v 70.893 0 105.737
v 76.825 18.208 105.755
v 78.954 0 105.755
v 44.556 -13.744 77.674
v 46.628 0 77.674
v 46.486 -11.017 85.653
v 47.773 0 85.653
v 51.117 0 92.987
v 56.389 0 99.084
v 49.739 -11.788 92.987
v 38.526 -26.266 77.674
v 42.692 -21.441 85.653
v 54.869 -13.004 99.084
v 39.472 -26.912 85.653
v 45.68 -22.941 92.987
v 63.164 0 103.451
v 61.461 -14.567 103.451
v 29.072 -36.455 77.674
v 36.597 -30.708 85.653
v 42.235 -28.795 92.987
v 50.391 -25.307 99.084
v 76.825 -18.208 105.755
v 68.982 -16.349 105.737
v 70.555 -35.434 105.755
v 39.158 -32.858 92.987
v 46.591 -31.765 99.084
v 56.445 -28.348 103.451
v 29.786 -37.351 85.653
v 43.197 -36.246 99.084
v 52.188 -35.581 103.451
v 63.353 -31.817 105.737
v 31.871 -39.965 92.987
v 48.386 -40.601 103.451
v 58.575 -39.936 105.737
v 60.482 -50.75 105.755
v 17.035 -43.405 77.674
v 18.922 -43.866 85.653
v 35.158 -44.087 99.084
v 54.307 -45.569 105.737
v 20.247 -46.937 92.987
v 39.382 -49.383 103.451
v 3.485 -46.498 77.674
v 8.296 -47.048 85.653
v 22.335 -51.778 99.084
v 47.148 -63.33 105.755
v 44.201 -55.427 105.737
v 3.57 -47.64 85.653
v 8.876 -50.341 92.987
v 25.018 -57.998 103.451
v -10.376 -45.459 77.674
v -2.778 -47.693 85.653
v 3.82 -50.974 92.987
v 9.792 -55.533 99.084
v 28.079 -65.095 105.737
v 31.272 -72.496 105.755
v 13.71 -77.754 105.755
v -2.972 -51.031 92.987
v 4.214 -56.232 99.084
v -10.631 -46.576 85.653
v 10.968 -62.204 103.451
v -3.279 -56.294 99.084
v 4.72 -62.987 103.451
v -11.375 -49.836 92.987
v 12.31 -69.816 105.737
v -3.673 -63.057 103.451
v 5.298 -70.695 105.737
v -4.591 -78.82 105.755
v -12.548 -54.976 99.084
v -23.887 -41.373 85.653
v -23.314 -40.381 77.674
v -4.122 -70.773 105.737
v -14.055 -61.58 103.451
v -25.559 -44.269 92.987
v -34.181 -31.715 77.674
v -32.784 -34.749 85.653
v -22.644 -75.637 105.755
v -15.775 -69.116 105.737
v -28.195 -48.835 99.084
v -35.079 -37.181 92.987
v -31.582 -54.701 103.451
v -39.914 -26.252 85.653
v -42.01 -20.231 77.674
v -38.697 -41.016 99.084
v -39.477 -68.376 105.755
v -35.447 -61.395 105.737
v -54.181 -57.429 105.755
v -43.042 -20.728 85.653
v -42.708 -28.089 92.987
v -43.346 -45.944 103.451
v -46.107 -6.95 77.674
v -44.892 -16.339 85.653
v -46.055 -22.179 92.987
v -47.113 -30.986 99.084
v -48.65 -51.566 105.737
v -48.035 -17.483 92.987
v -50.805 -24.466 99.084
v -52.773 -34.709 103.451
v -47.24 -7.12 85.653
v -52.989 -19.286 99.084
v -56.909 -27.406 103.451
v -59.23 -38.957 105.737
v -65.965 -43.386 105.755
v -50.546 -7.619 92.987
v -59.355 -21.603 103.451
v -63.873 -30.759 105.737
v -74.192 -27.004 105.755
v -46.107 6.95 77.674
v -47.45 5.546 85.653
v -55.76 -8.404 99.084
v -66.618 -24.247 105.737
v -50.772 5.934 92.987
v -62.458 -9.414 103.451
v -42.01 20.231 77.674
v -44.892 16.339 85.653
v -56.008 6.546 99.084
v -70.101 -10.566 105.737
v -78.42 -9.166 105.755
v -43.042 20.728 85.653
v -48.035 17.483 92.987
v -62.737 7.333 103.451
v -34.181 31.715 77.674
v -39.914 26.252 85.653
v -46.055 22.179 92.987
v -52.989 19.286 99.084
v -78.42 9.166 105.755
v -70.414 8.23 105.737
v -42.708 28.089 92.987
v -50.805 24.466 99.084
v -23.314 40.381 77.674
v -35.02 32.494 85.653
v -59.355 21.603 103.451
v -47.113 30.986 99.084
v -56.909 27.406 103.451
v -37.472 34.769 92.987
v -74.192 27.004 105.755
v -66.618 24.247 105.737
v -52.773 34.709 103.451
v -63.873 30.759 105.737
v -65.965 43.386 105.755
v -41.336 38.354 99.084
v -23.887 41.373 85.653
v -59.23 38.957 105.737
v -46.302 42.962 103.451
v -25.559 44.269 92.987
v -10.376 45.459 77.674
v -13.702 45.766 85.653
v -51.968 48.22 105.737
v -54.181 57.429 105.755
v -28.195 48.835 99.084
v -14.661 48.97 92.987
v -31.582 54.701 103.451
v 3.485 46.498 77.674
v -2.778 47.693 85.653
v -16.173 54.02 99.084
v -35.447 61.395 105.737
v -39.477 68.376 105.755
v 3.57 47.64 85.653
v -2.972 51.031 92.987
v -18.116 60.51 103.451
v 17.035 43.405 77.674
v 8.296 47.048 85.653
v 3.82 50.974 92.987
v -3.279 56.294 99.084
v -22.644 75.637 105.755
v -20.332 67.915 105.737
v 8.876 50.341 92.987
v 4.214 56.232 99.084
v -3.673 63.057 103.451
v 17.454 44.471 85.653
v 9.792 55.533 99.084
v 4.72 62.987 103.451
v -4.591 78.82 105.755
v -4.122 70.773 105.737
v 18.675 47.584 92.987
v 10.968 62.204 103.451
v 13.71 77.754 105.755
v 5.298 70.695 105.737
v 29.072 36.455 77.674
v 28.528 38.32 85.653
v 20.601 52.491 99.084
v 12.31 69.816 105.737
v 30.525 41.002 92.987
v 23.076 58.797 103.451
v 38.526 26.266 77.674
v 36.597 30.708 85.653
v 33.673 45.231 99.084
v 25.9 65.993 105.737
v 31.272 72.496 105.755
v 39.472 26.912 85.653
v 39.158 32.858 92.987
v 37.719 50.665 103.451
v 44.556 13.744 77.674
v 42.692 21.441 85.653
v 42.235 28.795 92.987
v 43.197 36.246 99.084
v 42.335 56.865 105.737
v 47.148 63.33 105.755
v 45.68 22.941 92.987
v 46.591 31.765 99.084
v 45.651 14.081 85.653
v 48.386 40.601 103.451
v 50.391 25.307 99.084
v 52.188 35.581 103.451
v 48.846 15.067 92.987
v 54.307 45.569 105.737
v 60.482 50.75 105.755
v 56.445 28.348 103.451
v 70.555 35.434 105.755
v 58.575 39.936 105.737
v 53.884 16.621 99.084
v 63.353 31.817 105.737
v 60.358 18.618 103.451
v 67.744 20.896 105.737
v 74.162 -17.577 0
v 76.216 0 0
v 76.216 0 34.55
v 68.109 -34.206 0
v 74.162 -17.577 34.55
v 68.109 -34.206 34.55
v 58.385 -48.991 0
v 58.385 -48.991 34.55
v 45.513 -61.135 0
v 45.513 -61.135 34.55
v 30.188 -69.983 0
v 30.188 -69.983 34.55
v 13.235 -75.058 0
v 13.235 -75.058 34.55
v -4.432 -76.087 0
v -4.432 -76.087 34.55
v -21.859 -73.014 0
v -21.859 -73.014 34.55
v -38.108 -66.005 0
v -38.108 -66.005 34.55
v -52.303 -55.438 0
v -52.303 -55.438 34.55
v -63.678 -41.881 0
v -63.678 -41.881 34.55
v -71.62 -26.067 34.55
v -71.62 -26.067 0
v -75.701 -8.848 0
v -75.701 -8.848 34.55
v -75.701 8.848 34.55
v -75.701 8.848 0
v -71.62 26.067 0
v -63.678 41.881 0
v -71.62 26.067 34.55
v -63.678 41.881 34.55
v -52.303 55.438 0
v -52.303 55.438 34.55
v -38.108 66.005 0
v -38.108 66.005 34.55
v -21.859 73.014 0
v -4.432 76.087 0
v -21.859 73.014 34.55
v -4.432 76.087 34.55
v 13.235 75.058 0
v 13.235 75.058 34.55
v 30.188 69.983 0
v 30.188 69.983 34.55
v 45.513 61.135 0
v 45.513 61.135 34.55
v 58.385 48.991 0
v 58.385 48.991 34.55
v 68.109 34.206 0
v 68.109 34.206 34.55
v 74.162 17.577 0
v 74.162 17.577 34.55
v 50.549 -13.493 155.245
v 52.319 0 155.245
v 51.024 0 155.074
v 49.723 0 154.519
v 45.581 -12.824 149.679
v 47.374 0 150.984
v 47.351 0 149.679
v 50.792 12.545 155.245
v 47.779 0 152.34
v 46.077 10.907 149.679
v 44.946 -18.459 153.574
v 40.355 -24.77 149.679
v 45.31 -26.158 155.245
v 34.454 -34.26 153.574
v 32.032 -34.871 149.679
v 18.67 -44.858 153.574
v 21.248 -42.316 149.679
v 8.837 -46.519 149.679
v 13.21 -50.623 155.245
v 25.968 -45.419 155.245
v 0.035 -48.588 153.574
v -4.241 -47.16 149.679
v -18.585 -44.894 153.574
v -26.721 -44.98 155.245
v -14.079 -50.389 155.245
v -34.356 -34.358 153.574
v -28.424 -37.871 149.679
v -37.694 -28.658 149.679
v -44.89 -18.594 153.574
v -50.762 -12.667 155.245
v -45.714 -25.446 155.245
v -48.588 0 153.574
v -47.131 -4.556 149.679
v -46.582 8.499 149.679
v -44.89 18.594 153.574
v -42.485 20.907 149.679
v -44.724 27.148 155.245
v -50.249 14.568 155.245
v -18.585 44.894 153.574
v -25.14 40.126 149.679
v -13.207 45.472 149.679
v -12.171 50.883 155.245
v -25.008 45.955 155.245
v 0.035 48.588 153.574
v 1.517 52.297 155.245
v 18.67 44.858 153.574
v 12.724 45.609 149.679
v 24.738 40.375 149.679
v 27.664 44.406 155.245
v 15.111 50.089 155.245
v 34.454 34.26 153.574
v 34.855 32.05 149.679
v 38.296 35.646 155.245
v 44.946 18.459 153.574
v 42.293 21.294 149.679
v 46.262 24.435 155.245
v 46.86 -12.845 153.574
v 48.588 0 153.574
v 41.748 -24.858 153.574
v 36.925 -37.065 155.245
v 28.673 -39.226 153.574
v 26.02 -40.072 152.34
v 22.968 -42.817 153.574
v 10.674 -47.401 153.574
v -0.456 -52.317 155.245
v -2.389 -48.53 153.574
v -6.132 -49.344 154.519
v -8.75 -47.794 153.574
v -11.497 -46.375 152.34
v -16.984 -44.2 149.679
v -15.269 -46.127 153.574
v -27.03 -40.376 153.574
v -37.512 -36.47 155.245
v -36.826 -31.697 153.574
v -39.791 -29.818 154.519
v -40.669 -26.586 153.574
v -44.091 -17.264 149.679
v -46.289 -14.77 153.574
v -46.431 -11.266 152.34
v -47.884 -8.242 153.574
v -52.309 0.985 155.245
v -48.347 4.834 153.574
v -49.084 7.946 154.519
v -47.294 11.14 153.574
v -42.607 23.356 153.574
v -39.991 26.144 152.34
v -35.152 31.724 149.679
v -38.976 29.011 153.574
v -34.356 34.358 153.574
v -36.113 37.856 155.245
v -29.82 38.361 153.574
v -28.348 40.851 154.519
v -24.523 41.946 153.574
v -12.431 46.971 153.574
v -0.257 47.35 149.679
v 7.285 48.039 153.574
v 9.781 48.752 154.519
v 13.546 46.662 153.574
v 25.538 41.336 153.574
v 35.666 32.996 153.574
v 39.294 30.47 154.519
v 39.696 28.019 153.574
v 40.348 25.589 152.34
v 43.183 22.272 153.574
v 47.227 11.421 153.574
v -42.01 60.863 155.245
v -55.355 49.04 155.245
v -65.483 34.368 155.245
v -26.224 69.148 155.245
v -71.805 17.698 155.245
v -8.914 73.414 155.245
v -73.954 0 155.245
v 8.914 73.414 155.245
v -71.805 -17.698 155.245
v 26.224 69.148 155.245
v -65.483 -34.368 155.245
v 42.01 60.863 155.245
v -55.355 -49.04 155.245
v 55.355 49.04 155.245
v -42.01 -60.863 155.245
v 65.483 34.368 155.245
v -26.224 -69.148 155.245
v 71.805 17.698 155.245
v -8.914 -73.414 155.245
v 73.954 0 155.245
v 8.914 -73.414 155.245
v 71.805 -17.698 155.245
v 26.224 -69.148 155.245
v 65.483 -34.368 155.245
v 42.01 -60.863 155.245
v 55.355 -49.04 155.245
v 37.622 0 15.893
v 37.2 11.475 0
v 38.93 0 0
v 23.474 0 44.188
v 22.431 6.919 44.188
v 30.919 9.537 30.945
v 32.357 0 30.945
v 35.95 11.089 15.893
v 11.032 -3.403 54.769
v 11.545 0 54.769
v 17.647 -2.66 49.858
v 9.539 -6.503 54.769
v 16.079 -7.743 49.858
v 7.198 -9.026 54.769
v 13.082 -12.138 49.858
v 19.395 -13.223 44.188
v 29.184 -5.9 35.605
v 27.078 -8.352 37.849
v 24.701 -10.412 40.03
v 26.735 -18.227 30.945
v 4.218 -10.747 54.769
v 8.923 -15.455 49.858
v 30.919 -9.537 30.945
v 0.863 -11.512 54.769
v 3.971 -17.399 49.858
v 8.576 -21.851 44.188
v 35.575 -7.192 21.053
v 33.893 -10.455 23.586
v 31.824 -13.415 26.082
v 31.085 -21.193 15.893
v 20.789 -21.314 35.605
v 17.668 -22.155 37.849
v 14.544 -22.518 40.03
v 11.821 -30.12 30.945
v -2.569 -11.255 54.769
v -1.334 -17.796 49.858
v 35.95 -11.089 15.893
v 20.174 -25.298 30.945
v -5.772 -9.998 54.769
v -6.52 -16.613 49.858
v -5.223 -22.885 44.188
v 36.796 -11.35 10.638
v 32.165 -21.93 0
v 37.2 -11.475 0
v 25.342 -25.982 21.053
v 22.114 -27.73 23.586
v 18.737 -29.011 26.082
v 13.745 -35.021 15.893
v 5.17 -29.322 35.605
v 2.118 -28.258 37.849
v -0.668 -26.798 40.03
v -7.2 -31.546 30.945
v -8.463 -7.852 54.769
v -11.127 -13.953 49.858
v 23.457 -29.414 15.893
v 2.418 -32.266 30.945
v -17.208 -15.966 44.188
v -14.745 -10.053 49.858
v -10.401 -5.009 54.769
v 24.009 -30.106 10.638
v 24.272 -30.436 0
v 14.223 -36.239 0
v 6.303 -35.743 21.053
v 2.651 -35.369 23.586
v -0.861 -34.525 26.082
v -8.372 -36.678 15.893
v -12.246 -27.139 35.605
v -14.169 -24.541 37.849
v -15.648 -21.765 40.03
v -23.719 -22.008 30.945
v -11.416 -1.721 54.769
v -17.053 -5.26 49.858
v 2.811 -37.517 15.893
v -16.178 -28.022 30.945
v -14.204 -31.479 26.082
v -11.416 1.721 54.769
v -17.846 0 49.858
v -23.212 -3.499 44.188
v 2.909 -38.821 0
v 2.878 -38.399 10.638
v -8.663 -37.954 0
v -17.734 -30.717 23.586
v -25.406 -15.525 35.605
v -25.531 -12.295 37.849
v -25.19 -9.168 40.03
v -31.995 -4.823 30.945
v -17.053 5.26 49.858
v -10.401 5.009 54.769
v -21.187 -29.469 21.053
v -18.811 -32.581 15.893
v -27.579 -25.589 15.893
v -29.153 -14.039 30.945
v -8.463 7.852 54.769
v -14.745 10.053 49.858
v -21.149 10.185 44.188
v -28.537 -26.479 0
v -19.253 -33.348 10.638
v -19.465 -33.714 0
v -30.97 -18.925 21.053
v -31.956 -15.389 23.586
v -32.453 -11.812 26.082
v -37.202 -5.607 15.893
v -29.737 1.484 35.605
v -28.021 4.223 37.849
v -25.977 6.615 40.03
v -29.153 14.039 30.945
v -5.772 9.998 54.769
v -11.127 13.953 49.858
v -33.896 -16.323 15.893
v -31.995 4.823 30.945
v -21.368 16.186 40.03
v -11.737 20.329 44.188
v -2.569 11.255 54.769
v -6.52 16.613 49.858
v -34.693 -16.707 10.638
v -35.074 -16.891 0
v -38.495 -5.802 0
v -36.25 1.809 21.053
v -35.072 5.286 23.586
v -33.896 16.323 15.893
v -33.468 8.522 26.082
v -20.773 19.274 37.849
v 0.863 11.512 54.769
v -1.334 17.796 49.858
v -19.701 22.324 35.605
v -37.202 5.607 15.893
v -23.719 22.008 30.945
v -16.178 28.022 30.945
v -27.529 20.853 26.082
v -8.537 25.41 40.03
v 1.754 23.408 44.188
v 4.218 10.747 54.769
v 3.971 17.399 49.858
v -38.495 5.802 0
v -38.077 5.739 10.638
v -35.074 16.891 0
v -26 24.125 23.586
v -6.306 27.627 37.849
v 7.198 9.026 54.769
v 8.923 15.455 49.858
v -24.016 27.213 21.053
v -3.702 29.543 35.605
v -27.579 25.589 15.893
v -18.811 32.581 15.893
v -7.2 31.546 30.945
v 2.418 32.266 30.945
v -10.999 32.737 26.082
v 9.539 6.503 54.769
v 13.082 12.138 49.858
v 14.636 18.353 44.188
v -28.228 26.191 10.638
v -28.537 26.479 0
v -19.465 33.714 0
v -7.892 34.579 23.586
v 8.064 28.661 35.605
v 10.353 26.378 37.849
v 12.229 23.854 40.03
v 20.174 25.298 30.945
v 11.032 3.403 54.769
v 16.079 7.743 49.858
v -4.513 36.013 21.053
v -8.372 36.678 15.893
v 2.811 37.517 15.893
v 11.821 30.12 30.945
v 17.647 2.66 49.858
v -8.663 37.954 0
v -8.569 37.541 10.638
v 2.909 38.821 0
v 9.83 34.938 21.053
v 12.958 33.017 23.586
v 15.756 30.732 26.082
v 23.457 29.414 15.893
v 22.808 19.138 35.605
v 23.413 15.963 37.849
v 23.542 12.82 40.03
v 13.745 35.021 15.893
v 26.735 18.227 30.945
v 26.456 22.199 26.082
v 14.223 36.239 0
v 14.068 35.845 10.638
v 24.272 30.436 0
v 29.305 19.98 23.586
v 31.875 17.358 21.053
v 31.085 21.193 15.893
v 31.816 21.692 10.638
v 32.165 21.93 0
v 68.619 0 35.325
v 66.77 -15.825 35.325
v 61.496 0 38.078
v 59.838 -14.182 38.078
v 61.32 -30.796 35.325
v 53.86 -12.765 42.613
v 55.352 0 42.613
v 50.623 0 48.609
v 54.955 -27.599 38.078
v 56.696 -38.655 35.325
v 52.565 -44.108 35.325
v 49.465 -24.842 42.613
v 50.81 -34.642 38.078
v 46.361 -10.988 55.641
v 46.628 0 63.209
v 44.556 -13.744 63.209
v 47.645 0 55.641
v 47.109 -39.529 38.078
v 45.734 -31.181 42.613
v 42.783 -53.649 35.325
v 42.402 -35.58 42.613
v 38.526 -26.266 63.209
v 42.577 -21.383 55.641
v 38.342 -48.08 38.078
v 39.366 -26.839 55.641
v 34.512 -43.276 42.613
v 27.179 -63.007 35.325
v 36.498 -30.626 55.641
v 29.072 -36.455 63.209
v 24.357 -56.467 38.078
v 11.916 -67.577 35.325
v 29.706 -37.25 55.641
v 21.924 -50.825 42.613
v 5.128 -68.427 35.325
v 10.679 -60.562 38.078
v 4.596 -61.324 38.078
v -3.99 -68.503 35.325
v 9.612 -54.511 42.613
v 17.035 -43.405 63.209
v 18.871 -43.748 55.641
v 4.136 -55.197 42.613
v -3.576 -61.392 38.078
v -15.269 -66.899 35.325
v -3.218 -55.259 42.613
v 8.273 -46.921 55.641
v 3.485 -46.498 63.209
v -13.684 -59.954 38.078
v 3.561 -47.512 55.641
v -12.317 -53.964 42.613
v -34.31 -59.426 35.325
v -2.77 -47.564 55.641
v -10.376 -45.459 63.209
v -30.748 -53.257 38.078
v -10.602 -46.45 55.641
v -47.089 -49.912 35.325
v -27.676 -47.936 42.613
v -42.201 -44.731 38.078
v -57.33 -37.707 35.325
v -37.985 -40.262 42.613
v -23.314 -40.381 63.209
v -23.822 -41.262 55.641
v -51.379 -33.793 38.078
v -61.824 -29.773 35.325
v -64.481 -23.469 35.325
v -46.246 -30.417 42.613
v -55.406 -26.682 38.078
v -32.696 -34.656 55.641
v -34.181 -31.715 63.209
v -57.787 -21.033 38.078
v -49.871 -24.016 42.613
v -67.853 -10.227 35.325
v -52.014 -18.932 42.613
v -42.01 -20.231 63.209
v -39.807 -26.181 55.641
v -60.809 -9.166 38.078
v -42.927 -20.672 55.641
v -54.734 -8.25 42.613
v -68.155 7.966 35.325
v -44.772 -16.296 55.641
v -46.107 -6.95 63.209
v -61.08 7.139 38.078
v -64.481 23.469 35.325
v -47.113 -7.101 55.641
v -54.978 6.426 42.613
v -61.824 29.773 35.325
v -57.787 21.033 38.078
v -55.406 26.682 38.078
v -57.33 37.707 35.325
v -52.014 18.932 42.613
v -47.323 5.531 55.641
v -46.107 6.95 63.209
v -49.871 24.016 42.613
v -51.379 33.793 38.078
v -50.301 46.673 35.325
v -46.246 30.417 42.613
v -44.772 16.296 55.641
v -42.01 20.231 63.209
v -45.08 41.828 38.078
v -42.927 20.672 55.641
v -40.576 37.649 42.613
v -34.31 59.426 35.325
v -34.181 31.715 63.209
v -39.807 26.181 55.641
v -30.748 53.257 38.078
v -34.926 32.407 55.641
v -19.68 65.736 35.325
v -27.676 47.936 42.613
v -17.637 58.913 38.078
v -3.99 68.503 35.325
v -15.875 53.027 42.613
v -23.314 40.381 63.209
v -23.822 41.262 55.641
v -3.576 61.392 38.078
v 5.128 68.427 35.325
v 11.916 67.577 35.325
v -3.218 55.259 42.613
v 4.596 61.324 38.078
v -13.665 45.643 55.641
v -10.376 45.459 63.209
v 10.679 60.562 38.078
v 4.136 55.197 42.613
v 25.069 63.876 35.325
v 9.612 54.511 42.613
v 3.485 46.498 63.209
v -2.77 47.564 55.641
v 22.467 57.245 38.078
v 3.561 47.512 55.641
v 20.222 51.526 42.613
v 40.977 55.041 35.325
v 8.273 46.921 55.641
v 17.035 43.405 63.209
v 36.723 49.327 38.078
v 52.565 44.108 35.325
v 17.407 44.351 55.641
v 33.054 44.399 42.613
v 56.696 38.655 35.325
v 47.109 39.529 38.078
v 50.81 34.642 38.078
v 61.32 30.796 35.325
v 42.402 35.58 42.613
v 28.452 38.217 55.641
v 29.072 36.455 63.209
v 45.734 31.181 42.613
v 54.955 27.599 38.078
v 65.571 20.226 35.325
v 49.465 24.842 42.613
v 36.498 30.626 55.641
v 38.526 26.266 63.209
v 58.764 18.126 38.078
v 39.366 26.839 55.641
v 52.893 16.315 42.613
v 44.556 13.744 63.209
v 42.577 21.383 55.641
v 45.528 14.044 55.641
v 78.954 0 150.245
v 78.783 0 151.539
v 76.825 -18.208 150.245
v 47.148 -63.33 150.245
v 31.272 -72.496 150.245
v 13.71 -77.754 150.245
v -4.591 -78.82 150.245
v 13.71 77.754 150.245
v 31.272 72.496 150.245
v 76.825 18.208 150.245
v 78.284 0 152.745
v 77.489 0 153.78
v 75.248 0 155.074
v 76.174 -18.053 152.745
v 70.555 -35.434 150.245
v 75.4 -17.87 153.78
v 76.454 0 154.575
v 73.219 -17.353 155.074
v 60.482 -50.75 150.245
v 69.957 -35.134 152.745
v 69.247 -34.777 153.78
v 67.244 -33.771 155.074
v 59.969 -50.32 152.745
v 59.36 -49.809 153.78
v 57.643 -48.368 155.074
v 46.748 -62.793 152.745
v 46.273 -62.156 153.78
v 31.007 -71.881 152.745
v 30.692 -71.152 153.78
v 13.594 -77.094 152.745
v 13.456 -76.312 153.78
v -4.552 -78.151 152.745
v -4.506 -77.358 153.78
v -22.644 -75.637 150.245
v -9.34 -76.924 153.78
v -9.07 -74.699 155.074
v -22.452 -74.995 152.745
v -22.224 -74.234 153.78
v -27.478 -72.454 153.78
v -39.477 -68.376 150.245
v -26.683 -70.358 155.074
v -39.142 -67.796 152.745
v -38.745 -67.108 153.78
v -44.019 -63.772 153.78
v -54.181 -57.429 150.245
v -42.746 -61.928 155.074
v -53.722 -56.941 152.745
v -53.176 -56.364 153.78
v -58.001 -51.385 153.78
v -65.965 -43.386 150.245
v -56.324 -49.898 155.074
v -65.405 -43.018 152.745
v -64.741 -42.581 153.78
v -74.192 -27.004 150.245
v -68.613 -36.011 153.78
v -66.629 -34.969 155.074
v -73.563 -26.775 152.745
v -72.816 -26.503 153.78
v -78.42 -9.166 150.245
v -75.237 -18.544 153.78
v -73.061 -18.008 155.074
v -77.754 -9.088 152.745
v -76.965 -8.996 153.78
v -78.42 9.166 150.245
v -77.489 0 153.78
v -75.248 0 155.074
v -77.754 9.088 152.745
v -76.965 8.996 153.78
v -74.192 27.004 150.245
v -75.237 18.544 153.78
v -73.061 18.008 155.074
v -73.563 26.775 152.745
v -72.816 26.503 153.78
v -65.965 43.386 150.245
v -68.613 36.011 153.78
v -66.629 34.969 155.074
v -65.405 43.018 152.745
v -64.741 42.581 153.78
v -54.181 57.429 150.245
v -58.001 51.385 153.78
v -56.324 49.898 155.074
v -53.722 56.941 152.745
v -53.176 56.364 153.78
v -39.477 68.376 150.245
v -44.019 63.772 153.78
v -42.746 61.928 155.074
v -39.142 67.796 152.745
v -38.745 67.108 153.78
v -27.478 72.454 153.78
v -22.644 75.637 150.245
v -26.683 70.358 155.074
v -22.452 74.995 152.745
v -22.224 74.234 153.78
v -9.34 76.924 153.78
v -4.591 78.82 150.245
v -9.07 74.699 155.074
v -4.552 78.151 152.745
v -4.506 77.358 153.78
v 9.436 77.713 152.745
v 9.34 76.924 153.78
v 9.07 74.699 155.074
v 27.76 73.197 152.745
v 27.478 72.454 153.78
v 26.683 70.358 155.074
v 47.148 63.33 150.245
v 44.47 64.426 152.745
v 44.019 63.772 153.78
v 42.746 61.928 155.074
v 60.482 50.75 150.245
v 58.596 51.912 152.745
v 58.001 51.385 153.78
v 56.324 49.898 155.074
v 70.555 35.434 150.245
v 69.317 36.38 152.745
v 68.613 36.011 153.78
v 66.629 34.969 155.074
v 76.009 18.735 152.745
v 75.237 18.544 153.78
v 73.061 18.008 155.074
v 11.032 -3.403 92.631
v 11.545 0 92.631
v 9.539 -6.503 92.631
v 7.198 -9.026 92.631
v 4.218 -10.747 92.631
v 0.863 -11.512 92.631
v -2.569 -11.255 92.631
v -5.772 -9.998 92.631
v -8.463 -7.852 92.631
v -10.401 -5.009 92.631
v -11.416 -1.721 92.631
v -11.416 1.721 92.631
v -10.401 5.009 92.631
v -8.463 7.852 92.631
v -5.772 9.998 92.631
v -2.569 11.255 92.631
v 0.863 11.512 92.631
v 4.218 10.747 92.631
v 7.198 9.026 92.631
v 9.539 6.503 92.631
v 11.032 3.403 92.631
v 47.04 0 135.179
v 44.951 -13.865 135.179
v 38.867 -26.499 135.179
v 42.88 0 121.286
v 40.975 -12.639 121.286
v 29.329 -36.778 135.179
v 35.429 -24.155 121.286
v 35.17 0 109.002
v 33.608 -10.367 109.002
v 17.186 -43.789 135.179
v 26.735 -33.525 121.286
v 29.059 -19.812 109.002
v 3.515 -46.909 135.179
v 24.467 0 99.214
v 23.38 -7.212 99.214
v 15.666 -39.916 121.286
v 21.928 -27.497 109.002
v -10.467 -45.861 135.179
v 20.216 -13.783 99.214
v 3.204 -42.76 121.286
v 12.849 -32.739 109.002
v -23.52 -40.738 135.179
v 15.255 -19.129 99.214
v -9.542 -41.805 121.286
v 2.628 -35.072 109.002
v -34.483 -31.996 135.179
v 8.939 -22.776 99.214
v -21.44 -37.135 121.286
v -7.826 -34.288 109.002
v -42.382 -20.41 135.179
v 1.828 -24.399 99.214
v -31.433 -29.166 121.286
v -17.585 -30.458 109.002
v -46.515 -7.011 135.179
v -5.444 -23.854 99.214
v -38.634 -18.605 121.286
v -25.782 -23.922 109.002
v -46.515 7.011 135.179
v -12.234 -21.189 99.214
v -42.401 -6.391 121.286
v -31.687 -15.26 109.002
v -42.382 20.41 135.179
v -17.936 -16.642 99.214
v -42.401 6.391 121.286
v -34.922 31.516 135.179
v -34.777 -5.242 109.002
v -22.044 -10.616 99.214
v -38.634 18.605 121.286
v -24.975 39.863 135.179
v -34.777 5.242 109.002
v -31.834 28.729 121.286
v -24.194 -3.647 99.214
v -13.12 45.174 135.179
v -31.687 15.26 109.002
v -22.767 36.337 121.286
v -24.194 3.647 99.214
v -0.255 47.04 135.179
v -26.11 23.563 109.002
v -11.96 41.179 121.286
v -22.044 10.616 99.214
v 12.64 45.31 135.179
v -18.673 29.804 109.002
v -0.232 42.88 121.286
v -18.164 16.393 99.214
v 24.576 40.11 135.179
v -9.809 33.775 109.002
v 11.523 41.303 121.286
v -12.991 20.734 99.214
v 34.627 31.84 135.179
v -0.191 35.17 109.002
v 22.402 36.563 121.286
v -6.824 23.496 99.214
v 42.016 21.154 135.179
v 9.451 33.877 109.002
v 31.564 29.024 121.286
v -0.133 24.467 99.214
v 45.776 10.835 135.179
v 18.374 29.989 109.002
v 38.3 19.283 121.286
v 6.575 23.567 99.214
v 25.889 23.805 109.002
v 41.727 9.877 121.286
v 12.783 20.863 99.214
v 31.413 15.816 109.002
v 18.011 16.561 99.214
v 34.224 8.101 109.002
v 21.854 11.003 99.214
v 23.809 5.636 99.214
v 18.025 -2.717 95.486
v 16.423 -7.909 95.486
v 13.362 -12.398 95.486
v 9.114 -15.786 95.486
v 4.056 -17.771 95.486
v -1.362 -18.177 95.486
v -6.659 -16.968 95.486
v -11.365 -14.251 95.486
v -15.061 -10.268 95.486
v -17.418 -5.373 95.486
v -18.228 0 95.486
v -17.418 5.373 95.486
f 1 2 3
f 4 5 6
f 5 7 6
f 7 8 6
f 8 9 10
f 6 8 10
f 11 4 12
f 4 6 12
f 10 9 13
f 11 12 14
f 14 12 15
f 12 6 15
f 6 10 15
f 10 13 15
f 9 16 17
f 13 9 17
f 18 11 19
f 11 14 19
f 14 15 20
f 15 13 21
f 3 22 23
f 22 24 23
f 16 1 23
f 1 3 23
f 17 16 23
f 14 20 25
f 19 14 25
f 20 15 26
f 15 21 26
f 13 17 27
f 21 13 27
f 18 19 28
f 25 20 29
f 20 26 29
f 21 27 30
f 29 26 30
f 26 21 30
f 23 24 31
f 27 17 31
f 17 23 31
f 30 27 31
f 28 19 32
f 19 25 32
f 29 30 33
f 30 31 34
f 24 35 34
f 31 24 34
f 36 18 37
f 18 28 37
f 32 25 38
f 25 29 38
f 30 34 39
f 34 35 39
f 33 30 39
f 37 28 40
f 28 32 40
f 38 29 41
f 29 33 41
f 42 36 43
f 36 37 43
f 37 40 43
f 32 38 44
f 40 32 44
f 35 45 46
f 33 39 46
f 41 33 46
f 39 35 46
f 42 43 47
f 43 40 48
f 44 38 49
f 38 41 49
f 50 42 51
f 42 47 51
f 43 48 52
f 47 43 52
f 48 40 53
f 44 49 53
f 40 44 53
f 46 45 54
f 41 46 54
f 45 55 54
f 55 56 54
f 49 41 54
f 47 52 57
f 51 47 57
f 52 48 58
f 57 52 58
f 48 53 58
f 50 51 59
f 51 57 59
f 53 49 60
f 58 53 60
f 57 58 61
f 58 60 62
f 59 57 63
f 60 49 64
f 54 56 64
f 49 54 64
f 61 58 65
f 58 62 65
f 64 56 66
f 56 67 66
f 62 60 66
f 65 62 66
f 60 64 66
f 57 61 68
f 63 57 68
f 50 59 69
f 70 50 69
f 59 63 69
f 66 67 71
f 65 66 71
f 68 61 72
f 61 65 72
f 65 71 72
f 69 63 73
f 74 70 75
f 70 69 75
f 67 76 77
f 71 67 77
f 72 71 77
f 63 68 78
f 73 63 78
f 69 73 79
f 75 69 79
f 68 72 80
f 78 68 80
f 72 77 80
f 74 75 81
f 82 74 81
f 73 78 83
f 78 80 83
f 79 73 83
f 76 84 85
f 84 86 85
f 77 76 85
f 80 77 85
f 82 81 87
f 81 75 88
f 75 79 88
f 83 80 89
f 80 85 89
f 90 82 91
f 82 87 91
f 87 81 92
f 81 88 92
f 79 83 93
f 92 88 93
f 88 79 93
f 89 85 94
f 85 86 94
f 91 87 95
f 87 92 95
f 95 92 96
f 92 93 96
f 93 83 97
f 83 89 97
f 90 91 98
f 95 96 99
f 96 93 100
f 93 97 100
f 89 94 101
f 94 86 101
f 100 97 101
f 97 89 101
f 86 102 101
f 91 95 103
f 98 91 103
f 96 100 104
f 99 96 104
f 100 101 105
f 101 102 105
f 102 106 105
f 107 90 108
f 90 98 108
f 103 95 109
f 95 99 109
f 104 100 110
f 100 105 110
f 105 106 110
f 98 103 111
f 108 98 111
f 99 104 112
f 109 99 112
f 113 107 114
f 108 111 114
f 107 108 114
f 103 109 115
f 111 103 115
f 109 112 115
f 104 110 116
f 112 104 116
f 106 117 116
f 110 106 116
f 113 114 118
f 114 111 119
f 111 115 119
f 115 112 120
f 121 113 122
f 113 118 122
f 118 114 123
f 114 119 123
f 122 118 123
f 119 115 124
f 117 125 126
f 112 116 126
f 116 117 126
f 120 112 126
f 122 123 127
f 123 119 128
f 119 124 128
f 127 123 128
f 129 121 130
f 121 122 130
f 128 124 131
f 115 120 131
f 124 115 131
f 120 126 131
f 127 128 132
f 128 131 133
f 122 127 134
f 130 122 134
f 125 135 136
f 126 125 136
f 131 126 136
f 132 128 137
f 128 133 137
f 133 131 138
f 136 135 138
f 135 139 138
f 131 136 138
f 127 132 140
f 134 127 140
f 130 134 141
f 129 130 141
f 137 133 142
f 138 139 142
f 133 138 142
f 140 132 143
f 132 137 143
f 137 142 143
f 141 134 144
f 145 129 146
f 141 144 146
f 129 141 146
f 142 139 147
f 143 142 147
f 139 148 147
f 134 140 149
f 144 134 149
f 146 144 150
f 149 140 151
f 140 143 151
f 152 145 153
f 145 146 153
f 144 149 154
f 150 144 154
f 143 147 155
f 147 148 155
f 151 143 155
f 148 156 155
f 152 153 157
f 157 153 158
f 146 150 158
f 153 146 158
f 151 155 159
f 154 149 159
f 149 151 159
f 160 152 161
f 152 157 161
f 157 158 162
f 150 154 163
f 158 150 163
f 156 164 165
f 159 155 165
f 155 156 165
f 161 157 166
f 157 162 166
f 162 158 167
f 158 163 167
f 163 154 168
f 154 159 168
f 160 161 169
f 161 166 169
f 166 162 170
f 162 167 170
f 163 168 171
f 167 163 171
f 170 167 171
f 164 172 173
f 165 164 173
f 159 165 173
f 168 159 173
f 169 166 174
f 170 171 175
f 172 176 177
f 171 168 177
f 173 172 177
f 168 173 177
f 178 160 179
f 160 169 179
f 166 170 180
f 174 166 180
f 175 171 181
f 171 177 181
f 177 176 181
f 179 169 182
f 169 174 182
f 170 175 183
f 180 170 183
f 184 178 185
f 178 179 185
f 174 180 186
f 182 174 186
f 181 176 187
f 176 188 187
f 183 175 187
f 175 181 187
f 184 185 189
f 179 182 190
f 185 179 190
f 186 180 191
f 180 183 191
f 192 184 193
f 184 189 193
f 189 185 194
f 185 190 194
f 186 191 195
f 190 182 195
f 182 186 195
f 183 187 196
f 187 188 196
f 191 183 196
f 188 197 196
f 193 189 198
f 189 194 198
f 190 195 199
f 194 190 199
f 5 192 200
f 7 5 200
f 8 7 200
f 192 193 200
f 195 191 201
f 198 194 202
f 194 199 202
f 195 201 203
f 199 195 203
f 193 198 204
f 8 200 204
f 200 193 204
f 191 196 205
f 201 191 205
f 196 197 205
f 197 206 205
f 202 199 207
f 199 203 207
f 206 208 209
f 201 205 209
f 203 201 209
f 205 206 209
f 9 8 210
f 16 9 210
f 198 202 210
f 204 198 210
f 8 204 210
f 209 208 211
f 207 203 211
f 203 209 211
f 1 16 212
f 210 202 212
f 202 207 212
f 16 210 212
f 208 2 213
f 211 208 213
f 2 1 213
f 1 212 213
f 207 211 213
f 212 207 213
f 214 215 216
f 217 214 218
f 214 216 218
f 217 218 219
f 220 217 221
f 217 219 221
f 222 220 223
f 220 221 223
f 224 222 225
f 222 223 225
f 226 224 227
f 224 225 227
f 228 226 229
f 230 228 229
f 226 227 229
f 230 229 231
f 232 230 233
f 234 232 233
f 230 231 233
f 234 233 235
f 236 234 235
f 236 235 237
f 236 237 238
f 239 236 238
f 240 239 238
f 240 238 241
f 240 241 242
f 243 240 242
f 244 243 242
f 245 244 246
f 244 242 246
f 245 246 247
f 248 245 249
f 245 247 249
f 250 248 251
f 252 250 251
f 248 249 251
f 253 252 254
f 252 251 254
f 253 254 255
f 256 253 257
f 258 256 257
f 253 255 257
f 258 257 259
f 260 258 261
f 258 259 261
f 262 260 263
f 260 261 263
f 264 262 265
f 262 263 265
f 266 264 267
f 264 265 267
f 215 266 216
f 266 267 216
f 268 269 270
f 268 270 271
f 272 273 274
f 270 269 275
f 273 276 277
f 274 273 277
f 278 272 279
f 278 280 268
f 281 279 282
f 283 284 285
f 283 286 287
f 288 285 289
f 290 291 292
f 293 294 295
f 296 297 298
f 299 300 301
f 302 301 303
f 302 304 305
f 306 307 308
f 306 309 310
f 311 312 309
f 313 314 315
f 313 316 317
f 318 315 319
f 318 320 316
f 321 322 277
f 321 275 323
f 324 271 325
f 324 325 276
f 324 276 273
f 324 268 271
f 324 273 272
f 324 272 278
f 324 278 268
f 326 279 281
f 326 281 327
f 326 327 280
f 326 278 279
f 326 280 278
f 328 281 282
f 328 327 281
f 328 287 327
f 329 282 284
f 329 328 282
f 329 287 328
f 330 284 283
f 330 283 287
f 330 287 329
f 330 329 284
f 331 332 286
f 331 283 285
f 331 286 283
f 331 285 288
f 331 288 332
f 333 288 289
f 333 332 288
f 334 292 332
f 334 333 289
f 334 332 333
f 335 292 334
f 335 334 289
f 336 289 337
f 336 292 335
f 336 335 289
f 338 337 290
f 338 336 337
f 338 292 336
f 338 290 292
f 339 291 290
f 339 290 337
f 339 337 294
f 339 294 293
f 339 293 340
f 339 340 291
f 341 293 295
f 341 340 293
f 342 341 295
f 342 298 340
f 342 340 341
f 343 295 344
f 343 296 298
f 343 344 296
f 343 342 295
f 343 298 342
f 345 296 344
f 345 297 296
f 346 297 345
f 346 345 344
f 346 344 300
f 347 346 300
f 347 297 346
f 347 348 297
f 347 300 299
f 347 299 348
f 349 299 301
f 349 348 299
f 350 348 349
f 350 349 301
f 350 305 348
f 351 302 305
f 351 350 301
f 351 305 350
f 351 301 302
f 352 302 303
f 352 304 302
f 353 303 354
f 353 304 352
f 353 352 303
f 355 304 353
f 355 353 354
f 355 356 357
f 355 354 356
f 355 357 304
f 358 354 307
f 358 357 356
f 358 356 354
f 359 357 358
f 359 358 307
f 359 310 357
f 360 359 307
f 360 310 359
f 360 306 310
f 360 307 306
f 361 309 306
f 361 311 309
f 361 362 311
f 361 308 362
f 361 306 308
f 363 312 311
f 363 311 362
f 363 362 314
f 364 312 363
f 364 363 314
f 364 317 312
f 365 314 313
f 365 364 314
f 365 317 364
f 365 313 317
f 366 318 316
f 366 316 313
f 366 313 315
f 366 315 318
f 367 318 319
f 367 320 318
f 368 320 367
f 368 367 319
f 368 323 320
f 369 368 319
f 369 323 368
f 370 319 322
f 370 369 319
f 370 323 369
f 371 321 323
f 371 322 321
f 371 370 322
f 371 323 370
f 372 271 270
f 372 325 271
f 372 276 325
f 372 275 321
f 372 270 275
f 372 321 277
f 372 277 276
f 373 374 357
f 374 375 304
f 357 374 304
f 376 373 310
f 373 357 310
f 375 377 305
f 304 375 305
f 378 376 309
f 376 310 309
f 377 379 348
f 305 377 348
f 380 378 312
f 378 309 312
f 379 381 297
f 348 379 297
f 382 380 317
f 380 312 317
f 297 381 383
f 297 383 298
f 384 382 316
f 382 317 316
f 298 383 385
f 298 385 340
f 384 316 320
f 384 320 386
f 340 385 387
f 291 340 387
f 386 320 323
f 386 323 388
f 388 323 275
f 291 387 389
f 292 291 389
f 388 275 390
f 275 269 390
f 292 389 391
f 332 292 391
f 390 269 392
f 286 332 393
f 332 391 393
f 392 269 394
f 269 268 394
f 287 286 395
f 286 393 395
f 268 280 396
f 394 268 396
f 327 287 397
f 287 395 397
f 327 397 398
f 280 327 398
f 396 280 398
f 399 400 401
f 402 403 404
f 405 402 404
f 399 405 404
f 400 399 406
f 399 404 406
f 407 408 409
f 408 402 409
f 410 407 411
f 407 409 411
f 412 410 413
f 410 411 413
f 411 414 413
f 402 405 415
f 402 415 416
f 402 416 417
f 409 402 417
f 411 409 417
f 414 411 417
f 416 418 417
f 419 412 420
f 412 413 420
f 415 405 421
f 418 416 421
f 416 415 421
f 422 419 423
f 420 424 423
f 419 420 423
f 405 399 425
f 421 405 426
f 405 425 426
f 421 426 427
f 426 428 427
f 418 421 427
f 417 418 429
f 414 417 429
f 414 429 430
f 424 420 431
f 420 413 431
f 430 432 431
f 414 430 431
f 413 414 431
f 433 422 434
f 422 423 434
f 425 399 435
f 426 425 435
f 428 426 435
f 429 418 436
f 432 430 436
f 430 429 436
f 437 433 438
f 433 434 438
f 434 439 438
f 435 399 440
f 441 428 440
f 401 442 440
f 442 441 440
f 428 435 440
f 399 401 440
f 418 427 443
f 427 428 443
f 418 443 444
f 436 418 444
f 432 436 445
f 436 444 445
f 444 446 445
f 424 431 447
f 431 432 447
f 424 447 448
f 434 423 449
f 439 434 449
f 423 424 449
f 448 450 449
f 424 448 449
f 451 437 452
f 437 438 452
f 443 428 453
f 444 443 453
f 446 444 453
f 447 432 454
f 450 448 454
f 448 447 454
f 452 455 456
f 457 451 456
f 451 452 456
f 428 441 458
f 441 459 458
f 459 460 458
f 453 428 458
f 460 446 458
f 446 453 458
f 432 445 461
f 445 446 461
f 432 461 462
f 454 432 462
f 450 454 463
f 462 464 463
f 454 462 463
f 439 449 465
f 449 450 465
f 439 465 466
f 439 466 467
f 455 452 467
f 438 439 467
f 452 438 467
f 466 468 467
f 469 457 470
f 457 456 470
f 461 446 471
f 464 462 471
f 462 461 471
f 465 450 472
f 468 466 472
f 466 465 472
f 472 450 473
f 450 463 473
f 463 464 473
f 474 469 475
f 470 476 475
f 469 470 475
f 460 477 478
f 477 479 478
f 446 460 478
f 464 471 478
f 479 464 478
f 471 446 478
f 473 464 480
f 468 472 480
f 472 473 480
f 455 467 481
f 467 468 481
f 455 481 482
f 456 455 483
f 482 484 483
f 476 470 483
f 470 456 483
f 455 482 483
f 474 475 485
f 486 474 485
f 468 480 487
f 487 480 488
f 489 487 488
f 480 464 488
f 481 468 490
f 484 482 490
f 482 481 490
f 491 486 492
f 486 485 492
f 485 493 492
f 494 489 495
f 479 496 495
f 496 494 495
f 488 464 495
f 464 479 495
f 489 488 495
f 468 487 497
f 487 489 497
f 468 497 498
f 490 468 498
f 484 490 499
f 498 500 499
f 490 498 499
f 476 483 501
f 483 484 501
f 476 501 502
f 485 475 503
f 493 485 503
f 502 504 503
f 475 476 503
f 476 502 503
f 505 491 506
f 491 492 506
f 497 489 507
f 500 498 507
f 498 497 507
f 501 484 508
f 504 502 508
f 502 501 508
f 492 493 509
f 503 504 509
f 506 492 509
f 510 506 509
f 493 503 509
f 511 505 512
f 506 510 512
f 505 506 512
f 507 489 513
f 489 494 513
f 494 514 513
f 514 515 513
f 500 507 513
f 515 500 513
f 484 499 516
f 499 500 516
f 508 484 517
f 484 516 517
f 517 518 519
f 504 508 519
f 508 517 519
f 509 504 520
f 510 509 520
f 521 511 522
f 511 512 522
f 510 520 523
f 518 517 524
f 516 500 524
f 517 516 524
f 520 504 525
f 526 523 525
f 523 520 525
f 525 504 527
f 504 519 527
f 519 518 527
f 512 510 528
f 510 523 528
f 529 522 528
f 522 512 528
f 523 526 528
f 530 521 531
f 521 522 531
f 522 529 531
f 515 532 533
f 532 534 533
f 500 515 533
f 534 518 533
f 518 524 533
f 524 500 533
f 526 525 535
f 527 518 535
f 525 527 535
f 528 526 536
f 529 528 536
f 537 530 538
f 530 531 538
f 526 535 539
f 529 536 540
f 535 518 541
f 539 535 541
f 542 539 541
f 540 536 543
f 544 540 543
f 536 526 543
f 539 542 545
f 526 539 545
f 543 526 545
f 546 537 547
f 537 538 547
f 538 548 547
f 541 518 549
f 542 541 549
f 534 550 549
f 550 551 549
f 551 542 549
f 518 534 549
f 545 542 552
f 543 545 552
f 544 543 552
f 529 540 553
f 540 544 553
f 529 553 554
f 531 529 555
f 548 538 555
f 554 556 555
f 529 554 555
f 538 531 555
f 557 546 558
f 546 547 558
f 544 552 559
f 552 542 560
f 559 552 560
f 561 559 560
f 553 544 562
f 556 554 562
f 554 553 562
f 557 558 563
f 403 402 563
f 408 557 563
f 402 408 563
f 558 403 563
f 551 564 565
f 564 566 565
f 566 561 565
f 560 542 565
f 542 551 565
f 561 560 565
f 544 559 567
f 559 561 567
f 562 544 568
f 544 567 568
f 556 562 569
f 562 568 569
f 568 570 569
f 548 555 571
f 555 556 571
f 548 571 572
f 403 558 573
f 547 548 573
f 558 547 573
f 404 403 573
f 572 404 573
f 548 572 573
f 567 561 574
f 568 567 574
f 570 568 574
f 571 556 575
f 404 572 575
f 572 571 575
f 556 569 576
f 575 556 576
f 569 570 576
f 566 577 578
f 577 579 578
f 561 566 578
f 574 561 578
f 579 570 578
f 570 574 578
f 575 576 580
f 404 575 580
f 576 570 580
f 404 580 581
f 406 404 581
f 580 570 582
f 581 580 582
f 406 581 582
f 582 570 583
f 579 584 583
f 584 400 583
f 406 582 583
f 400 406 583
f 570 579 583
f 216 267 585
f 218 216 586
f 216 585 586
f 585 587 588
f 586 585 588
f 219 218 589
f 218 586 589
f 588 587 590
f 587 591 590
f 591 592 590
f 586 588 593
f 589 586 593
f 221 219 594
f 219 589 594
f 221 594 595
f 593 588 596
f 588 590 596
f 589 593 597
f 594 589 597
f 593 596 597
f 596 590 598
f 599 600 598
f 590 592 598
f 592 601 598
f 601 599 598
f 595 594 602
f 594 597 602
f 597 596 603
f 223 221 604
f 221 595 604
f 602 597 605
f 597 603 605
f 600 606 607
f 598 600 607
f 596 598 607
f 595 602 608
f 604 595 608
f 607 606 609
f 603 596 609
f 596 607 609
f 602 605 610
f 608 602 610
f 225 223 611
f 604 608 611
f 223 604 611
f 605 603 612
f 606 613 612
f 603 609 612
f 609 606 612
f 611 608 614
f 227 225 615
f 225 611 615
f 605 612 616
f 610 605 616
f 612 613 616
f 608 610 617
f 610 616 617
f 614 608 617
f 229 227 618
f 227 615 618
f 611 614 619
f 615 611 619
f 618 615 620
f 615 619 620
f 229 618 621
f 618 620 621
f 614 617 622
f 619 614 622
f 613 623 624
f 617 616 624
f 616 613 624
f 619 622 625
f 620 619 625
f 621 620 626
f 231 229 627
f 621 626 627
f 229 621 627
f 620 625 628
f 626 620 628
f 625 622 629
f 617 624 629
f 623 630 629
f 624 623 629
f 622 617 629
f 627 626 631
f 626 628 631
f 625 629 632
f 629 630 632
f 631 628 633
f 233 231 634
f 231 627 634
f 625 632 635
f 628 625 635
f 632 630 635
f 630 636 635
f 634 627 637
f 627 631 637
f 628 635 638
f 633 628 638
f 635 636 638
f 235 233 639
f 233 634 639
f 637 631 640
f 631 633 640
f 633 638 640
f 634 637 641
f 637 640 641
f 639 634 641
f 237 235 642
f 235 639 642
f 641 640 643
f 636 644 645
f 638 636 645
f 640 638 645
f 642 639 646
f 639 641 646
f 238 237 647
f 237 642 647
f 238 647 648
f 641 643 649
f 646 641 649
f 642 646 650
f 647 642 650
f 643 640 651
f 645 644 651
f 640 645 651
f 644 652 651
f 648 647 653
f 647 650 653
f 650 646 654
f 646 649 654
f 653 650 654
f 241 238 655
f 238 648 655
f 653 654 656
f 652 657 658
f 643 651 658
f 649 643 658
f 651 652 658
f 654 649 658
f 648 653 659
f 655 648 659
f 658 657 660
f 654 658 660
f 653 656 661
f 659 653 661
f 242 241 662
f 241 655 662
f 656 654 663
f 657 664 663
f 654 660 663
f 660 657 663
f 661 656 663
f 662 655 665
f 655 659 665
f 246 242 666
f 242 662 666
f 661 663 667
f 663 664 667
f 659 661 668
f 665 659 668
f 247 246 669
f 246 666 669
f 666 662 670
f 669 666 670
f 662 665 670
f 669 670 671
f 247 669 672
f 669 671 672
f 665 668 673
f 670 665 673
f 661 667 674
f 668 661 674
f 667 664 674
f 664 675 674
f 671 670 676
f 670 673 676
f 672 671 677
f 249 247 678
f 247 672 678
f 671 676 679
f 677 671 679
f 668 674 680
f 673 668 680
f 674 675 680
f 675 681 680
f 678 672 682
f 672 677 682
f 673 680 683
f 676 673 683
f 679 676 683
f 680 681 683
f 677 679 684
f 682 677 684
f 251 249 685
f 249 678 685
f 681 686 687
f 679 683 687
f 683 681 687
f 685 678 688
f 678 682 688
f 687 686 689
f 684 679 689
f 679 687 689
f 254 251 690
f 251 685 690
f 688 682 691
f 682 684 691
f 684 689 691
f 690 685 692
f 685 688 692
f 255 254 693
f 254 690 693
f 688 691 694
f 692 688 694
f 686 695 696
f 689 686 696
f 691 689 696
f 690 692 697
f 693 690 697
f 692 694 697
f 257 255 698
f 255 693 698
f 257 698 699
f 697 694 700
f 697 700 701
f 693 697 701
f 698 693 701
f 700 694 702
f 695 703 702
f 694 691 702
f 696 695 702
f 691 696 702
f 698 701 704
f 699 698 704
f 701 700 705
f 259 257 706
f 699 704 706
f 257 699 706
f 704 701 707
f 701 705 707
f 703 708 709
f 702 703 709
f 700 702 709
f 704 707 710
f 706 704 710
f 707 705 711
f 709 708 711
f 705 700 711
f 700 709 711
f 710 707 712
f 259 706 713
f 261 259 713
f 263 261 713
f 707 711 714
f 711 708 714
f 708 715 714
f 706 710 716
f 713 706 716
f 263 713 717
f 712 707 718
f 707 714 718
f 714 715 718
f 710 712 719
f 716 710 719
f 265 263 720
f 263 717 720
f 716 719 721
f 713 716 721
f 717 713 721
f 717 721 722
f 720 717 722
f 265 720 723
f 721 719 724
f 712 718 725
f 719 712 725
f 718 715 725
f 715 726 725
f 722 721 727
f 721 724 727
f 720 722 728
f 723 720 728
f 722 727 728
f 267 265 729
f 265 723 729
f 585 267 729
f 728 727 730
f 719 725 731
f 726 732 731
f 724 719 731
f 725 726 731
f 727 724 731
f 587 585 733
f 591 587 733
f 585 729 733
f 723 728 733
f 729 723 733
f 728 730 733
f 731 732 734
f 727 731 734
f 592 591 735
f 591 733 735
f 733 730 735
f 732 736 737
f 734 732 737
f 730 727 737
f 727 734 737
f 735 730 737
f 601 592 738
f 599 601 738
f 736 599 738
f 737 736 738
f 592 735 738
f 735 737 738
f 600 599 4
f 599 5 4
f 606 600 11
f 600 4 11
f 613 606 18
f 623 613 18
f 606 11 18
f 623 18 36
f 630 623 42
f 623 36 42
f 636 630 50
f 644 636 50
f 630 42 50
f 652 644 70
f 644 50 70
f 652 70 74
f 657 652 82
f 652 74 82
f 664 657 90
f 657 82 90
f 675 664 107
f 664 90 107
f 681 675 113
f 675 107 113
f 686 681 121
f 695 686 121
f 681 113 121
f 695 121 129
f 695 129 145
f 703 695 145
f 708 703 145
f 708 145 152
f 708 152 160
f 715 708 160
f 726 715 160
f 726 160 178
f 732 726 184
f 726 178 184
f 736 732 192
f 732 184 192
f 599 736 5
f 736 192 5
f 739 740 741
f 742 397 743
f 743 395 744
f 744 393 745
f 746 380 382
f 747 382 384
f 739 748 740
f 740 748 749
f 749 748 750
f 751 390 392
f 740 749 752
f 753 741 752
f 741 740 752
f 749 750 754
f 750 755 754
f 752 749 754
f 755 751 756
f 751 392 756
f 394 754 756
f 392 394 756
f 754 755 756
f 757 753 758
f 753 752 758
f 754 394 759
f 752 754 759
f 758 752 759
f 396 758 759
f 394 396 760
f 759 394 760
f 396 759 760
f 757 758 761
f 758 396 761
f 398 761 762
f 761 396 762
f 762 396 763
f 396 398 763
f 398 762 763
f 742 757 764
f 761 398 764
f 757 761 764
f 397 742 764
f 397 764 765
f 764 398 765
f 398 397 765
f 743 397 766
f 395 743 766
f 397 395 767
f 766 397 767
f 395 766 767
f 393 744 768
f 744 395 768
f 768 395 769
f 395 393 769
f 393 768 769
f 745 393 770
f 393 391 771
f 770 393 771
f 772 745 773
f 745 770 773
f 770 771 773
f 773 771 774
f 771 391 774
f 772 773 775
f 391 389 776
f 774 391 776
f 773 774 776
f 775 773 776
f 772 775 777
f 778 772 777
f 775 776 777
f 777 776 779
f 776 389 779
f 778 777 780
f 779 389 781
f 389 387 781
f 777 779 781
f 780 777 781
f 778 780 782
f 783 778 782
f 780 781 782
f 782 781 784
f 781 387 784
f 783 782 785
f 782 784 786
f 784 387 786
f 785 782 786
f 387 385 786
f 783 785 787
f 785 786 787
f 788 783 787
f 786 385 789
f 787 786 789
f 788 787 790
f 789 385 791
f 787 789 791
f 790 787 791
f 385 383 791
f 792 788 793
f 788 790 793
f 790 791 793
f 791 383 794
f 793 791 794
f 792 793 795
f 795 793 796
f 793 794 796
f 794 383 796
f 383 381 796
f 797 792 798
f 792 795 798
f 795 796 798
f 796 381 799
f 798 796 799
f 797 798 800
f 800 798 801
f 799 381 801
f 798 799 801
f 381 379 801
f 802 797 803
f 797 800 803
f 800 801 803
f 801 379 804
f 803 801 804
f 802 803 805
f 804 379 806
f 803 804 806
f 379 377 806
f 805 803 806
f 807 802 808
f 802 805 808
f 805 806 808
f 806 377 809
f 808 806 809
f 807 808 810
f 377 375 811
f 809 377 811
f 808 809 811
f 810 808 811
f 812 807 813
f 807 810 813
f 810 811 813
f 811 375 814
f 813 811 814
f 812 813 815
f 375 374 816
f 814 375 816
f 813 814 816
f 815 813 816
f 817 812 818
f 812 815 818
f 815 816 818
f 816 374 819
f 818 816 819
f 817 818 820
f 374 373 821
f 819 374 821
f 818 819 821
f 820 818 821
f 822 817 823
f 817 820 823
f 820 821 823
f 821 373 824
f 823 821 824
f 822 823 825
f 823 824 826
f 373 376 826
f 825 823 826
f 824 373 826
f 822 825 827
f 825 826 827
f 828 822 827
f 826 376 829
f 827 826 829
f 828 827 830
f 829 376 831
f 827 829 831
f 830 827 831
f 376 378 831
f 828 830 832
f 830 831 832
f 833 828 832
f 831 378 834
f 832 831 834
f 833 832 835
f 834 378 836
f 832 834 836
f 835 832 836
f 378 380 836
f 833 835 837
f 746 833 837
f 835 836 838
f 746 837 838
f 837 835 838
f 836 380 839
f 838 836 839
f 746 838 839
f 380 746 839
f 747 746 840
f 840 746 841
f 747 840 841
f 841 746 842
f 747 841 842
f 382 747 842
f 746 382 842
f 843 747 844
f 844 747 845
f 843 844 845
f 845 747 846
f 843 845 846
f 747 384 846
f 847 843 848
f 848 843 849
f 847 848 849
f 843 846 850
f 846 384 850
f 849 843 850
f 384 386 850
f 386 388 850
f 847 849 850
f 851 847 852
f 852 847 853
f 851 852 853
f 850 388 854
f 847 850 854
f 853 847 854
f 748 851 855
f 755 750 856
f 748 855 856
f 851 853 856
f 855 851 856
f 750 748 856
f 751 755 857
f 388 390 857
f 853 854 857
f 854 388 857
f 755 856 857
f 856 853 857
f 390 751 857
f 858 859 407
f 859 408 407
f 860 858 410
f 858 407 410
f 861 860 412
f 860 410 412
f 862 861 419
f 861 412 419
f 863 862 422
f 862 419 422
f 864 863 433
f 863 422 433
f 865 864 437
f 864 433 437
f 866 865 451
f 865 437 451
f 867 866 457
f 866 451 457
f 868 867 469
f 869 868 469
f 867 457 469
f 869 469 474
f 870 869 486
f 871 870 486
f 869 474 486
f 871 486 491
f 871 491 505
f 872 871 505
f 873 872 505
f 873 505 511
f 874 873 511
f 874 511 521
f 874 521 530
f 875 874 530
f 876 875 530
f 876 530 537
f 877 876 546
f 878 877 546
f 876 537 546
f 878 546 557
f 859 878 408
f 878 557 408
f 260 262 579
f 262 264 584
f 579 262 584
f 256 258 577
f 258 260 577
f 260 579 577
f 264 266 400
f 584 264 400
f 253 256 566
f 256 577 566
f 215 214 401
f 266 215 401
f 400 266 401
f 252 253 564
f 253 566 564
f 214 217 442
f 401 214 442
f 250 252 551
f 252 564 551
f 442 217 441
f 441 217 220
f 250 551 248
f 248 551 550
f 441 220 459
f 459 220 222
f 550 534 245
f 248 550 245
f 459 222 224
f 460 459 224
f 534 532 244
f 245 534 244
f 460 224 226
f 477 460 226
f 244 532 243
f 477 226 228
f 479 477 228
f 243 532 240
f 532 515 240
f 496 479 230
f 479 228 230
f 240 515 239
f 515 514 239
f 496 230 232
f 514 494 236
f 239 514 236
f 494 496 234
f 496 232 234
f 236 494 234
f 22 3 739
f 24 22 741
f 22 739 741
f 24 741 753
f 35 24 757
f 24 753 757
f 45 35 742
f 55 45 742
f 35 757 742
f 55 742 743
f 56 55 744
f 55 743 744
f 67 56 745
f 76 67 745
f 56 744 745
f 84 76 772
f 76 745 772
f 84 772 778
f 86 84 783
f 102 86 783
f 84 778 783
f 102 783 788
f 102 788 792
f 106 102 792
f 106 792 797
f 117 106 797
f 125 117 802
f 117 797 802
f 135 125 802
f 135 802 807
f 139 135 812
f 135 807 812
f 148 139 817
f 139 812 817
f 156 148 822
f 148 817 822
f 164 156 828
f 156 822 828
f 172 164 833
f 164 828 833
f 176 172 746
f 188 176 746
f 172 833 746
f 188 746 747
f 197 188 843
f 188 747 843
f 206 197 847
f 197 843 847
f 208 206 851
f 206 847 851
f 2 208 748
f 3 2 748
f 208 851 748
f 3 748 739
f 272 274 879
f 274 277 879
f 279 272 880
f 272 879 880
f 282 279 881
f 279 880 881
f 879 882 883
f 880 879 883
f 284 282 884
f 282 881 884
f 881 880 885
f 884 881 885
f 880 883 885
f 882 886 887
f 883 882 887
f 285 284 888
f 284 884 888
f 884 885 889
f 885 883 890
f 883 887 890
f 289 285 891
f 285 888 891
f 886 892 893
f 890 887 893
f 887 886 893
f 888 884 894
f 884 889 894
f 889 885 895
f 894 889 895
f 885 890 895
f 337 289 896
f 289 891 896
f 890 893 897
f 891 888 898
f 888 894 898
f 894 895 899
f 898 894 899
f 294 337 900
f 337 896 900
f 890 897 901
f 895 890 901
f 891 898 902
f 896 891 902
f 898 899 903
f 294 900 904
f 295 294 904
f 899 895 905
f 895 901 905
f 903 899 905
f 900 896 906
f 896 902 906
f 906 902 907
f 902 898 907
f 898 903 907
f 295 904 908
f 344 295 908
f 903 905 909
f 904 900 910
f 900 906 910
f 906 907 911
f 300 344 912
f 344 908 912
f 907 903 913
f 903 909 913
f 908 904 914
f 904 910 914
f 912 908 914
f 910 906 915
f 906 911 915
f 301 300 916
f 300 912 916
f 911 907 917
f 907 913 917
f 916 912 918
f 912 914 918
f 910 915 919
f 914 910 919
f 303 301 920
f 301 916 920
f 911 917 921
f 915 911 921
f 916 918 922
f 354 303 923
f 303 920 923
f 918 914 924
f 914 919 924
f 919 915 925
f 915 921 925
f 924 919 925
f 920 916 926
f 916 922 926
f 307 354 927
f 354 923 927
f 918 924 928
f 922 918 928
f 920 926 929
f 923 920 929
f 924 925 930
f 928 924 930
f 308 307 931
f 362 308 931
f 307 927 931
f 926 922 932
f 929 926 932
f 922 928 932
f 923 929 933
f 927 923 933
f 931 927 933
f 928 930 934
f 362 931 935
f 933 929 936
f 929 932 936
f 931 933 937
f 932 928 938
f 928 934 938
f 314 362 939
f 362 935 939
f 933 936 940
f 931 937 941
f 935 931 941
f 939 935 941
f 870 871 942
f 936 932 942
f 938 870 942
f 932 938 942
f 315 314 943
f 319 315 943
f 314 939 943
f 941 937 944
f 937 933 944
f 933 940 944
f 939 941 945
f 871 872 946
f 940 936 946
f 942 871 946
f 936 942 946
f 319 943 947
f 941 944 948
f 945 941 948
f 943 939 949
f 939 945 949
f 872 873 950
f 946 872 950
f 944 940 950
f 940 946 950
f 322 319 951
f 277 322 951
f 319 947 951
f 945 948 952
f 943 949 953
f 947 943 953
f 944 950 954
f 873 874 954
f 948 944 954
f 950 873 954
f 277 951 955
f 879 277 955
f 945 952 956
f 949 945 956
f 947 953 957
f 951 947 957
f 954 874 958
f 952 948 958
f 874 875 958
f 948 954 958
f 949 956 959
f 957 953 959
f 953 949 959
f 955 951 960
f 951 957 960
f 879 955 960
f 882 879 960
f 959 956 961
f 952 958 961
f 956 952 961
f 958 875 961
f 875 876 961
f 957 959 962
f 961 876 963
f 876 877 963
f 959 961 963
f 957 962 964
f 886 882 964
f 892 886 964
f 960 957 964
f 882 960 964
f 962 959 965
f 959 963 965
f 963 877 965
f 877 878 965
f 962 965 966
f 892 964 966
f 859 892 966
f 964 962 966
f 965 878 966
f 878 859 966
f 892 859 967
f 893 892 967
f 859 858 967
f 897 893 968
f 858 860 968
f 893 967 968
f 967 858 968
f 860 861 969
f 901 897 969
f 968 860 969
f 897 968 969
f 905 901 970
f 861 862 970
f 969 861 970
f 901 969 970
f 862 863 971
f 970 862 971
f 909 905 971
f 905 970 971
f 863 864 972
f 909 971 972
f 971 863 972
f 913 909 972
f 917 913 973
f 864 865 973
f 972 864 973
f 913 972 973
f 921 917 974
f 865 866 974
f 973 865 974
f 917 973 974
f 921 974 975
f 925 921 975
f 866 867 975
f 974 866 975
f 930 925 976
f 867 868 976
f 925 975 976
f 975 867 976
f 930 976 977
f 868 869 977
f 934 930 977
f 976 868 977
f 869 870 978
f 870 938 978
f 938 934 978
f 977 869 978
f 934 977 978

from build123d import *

# Parameters (mm, degrees)
F3_R = 5


# Not quite as in the source:
# - a feature of the source that left no trace in its solid (it failed there, or was rolled back) is left out


with BuildPart() as f2:
    # F0 (on Front) → F2 (revolve)
    with BuildSketch(Plane.XZ):
        with BuildLine():
            Line((38.9296258549, 0), (76.2161314487, 0))
            Line((76.2161314487, 0), (76.2161314487, 34.5504507422))
            ThreePointArc((76.2161314487, 34.5504507422), (55.3522757176, 42.613287739), (46.6280132532, 63.2093325257))
            Line((46.6280132532, 63.2093325257), (46.6280132532, 77.6744805479))
            ThreePointArc((46.6280132532, 77.6744805479), (56.3893375618, 99.0839330453), (78.9535716176, 105.7550236583))
            Line((78.9535716176, 105.7550236583), (78.9535716176, 155.2447585142))
            Line((78.9535716176, 155.2447585142), (46.4198933914, 155.2447585142))
            ThreePointArc((46.4198933914, 155.2447585142), (40.8771418071, 117.3123958387), (11.5445833653, 92.6306769252))
            Line((11.5445833653, 92.6306769252), (11.5445833653, 54.7694249827))
            ThreePointArc((11.5445833653, 54.7694249827), (32.356898751, 30.9446524602), (38.9296258549, 0))
        make_face()
    revolve(axis=Axis((0, 0, 66.4308094728), (0, 0, -1)))

    # F3
    f3_edges = [f2.edges().sort_by_distance(p)[0] for p in [
        (-78.953572, 0, 155.244759),
        (-46.419893, 0, 155.244759),
    ]]
    fillet(f3_edges, radius=F3_R)


solid = f2.part
